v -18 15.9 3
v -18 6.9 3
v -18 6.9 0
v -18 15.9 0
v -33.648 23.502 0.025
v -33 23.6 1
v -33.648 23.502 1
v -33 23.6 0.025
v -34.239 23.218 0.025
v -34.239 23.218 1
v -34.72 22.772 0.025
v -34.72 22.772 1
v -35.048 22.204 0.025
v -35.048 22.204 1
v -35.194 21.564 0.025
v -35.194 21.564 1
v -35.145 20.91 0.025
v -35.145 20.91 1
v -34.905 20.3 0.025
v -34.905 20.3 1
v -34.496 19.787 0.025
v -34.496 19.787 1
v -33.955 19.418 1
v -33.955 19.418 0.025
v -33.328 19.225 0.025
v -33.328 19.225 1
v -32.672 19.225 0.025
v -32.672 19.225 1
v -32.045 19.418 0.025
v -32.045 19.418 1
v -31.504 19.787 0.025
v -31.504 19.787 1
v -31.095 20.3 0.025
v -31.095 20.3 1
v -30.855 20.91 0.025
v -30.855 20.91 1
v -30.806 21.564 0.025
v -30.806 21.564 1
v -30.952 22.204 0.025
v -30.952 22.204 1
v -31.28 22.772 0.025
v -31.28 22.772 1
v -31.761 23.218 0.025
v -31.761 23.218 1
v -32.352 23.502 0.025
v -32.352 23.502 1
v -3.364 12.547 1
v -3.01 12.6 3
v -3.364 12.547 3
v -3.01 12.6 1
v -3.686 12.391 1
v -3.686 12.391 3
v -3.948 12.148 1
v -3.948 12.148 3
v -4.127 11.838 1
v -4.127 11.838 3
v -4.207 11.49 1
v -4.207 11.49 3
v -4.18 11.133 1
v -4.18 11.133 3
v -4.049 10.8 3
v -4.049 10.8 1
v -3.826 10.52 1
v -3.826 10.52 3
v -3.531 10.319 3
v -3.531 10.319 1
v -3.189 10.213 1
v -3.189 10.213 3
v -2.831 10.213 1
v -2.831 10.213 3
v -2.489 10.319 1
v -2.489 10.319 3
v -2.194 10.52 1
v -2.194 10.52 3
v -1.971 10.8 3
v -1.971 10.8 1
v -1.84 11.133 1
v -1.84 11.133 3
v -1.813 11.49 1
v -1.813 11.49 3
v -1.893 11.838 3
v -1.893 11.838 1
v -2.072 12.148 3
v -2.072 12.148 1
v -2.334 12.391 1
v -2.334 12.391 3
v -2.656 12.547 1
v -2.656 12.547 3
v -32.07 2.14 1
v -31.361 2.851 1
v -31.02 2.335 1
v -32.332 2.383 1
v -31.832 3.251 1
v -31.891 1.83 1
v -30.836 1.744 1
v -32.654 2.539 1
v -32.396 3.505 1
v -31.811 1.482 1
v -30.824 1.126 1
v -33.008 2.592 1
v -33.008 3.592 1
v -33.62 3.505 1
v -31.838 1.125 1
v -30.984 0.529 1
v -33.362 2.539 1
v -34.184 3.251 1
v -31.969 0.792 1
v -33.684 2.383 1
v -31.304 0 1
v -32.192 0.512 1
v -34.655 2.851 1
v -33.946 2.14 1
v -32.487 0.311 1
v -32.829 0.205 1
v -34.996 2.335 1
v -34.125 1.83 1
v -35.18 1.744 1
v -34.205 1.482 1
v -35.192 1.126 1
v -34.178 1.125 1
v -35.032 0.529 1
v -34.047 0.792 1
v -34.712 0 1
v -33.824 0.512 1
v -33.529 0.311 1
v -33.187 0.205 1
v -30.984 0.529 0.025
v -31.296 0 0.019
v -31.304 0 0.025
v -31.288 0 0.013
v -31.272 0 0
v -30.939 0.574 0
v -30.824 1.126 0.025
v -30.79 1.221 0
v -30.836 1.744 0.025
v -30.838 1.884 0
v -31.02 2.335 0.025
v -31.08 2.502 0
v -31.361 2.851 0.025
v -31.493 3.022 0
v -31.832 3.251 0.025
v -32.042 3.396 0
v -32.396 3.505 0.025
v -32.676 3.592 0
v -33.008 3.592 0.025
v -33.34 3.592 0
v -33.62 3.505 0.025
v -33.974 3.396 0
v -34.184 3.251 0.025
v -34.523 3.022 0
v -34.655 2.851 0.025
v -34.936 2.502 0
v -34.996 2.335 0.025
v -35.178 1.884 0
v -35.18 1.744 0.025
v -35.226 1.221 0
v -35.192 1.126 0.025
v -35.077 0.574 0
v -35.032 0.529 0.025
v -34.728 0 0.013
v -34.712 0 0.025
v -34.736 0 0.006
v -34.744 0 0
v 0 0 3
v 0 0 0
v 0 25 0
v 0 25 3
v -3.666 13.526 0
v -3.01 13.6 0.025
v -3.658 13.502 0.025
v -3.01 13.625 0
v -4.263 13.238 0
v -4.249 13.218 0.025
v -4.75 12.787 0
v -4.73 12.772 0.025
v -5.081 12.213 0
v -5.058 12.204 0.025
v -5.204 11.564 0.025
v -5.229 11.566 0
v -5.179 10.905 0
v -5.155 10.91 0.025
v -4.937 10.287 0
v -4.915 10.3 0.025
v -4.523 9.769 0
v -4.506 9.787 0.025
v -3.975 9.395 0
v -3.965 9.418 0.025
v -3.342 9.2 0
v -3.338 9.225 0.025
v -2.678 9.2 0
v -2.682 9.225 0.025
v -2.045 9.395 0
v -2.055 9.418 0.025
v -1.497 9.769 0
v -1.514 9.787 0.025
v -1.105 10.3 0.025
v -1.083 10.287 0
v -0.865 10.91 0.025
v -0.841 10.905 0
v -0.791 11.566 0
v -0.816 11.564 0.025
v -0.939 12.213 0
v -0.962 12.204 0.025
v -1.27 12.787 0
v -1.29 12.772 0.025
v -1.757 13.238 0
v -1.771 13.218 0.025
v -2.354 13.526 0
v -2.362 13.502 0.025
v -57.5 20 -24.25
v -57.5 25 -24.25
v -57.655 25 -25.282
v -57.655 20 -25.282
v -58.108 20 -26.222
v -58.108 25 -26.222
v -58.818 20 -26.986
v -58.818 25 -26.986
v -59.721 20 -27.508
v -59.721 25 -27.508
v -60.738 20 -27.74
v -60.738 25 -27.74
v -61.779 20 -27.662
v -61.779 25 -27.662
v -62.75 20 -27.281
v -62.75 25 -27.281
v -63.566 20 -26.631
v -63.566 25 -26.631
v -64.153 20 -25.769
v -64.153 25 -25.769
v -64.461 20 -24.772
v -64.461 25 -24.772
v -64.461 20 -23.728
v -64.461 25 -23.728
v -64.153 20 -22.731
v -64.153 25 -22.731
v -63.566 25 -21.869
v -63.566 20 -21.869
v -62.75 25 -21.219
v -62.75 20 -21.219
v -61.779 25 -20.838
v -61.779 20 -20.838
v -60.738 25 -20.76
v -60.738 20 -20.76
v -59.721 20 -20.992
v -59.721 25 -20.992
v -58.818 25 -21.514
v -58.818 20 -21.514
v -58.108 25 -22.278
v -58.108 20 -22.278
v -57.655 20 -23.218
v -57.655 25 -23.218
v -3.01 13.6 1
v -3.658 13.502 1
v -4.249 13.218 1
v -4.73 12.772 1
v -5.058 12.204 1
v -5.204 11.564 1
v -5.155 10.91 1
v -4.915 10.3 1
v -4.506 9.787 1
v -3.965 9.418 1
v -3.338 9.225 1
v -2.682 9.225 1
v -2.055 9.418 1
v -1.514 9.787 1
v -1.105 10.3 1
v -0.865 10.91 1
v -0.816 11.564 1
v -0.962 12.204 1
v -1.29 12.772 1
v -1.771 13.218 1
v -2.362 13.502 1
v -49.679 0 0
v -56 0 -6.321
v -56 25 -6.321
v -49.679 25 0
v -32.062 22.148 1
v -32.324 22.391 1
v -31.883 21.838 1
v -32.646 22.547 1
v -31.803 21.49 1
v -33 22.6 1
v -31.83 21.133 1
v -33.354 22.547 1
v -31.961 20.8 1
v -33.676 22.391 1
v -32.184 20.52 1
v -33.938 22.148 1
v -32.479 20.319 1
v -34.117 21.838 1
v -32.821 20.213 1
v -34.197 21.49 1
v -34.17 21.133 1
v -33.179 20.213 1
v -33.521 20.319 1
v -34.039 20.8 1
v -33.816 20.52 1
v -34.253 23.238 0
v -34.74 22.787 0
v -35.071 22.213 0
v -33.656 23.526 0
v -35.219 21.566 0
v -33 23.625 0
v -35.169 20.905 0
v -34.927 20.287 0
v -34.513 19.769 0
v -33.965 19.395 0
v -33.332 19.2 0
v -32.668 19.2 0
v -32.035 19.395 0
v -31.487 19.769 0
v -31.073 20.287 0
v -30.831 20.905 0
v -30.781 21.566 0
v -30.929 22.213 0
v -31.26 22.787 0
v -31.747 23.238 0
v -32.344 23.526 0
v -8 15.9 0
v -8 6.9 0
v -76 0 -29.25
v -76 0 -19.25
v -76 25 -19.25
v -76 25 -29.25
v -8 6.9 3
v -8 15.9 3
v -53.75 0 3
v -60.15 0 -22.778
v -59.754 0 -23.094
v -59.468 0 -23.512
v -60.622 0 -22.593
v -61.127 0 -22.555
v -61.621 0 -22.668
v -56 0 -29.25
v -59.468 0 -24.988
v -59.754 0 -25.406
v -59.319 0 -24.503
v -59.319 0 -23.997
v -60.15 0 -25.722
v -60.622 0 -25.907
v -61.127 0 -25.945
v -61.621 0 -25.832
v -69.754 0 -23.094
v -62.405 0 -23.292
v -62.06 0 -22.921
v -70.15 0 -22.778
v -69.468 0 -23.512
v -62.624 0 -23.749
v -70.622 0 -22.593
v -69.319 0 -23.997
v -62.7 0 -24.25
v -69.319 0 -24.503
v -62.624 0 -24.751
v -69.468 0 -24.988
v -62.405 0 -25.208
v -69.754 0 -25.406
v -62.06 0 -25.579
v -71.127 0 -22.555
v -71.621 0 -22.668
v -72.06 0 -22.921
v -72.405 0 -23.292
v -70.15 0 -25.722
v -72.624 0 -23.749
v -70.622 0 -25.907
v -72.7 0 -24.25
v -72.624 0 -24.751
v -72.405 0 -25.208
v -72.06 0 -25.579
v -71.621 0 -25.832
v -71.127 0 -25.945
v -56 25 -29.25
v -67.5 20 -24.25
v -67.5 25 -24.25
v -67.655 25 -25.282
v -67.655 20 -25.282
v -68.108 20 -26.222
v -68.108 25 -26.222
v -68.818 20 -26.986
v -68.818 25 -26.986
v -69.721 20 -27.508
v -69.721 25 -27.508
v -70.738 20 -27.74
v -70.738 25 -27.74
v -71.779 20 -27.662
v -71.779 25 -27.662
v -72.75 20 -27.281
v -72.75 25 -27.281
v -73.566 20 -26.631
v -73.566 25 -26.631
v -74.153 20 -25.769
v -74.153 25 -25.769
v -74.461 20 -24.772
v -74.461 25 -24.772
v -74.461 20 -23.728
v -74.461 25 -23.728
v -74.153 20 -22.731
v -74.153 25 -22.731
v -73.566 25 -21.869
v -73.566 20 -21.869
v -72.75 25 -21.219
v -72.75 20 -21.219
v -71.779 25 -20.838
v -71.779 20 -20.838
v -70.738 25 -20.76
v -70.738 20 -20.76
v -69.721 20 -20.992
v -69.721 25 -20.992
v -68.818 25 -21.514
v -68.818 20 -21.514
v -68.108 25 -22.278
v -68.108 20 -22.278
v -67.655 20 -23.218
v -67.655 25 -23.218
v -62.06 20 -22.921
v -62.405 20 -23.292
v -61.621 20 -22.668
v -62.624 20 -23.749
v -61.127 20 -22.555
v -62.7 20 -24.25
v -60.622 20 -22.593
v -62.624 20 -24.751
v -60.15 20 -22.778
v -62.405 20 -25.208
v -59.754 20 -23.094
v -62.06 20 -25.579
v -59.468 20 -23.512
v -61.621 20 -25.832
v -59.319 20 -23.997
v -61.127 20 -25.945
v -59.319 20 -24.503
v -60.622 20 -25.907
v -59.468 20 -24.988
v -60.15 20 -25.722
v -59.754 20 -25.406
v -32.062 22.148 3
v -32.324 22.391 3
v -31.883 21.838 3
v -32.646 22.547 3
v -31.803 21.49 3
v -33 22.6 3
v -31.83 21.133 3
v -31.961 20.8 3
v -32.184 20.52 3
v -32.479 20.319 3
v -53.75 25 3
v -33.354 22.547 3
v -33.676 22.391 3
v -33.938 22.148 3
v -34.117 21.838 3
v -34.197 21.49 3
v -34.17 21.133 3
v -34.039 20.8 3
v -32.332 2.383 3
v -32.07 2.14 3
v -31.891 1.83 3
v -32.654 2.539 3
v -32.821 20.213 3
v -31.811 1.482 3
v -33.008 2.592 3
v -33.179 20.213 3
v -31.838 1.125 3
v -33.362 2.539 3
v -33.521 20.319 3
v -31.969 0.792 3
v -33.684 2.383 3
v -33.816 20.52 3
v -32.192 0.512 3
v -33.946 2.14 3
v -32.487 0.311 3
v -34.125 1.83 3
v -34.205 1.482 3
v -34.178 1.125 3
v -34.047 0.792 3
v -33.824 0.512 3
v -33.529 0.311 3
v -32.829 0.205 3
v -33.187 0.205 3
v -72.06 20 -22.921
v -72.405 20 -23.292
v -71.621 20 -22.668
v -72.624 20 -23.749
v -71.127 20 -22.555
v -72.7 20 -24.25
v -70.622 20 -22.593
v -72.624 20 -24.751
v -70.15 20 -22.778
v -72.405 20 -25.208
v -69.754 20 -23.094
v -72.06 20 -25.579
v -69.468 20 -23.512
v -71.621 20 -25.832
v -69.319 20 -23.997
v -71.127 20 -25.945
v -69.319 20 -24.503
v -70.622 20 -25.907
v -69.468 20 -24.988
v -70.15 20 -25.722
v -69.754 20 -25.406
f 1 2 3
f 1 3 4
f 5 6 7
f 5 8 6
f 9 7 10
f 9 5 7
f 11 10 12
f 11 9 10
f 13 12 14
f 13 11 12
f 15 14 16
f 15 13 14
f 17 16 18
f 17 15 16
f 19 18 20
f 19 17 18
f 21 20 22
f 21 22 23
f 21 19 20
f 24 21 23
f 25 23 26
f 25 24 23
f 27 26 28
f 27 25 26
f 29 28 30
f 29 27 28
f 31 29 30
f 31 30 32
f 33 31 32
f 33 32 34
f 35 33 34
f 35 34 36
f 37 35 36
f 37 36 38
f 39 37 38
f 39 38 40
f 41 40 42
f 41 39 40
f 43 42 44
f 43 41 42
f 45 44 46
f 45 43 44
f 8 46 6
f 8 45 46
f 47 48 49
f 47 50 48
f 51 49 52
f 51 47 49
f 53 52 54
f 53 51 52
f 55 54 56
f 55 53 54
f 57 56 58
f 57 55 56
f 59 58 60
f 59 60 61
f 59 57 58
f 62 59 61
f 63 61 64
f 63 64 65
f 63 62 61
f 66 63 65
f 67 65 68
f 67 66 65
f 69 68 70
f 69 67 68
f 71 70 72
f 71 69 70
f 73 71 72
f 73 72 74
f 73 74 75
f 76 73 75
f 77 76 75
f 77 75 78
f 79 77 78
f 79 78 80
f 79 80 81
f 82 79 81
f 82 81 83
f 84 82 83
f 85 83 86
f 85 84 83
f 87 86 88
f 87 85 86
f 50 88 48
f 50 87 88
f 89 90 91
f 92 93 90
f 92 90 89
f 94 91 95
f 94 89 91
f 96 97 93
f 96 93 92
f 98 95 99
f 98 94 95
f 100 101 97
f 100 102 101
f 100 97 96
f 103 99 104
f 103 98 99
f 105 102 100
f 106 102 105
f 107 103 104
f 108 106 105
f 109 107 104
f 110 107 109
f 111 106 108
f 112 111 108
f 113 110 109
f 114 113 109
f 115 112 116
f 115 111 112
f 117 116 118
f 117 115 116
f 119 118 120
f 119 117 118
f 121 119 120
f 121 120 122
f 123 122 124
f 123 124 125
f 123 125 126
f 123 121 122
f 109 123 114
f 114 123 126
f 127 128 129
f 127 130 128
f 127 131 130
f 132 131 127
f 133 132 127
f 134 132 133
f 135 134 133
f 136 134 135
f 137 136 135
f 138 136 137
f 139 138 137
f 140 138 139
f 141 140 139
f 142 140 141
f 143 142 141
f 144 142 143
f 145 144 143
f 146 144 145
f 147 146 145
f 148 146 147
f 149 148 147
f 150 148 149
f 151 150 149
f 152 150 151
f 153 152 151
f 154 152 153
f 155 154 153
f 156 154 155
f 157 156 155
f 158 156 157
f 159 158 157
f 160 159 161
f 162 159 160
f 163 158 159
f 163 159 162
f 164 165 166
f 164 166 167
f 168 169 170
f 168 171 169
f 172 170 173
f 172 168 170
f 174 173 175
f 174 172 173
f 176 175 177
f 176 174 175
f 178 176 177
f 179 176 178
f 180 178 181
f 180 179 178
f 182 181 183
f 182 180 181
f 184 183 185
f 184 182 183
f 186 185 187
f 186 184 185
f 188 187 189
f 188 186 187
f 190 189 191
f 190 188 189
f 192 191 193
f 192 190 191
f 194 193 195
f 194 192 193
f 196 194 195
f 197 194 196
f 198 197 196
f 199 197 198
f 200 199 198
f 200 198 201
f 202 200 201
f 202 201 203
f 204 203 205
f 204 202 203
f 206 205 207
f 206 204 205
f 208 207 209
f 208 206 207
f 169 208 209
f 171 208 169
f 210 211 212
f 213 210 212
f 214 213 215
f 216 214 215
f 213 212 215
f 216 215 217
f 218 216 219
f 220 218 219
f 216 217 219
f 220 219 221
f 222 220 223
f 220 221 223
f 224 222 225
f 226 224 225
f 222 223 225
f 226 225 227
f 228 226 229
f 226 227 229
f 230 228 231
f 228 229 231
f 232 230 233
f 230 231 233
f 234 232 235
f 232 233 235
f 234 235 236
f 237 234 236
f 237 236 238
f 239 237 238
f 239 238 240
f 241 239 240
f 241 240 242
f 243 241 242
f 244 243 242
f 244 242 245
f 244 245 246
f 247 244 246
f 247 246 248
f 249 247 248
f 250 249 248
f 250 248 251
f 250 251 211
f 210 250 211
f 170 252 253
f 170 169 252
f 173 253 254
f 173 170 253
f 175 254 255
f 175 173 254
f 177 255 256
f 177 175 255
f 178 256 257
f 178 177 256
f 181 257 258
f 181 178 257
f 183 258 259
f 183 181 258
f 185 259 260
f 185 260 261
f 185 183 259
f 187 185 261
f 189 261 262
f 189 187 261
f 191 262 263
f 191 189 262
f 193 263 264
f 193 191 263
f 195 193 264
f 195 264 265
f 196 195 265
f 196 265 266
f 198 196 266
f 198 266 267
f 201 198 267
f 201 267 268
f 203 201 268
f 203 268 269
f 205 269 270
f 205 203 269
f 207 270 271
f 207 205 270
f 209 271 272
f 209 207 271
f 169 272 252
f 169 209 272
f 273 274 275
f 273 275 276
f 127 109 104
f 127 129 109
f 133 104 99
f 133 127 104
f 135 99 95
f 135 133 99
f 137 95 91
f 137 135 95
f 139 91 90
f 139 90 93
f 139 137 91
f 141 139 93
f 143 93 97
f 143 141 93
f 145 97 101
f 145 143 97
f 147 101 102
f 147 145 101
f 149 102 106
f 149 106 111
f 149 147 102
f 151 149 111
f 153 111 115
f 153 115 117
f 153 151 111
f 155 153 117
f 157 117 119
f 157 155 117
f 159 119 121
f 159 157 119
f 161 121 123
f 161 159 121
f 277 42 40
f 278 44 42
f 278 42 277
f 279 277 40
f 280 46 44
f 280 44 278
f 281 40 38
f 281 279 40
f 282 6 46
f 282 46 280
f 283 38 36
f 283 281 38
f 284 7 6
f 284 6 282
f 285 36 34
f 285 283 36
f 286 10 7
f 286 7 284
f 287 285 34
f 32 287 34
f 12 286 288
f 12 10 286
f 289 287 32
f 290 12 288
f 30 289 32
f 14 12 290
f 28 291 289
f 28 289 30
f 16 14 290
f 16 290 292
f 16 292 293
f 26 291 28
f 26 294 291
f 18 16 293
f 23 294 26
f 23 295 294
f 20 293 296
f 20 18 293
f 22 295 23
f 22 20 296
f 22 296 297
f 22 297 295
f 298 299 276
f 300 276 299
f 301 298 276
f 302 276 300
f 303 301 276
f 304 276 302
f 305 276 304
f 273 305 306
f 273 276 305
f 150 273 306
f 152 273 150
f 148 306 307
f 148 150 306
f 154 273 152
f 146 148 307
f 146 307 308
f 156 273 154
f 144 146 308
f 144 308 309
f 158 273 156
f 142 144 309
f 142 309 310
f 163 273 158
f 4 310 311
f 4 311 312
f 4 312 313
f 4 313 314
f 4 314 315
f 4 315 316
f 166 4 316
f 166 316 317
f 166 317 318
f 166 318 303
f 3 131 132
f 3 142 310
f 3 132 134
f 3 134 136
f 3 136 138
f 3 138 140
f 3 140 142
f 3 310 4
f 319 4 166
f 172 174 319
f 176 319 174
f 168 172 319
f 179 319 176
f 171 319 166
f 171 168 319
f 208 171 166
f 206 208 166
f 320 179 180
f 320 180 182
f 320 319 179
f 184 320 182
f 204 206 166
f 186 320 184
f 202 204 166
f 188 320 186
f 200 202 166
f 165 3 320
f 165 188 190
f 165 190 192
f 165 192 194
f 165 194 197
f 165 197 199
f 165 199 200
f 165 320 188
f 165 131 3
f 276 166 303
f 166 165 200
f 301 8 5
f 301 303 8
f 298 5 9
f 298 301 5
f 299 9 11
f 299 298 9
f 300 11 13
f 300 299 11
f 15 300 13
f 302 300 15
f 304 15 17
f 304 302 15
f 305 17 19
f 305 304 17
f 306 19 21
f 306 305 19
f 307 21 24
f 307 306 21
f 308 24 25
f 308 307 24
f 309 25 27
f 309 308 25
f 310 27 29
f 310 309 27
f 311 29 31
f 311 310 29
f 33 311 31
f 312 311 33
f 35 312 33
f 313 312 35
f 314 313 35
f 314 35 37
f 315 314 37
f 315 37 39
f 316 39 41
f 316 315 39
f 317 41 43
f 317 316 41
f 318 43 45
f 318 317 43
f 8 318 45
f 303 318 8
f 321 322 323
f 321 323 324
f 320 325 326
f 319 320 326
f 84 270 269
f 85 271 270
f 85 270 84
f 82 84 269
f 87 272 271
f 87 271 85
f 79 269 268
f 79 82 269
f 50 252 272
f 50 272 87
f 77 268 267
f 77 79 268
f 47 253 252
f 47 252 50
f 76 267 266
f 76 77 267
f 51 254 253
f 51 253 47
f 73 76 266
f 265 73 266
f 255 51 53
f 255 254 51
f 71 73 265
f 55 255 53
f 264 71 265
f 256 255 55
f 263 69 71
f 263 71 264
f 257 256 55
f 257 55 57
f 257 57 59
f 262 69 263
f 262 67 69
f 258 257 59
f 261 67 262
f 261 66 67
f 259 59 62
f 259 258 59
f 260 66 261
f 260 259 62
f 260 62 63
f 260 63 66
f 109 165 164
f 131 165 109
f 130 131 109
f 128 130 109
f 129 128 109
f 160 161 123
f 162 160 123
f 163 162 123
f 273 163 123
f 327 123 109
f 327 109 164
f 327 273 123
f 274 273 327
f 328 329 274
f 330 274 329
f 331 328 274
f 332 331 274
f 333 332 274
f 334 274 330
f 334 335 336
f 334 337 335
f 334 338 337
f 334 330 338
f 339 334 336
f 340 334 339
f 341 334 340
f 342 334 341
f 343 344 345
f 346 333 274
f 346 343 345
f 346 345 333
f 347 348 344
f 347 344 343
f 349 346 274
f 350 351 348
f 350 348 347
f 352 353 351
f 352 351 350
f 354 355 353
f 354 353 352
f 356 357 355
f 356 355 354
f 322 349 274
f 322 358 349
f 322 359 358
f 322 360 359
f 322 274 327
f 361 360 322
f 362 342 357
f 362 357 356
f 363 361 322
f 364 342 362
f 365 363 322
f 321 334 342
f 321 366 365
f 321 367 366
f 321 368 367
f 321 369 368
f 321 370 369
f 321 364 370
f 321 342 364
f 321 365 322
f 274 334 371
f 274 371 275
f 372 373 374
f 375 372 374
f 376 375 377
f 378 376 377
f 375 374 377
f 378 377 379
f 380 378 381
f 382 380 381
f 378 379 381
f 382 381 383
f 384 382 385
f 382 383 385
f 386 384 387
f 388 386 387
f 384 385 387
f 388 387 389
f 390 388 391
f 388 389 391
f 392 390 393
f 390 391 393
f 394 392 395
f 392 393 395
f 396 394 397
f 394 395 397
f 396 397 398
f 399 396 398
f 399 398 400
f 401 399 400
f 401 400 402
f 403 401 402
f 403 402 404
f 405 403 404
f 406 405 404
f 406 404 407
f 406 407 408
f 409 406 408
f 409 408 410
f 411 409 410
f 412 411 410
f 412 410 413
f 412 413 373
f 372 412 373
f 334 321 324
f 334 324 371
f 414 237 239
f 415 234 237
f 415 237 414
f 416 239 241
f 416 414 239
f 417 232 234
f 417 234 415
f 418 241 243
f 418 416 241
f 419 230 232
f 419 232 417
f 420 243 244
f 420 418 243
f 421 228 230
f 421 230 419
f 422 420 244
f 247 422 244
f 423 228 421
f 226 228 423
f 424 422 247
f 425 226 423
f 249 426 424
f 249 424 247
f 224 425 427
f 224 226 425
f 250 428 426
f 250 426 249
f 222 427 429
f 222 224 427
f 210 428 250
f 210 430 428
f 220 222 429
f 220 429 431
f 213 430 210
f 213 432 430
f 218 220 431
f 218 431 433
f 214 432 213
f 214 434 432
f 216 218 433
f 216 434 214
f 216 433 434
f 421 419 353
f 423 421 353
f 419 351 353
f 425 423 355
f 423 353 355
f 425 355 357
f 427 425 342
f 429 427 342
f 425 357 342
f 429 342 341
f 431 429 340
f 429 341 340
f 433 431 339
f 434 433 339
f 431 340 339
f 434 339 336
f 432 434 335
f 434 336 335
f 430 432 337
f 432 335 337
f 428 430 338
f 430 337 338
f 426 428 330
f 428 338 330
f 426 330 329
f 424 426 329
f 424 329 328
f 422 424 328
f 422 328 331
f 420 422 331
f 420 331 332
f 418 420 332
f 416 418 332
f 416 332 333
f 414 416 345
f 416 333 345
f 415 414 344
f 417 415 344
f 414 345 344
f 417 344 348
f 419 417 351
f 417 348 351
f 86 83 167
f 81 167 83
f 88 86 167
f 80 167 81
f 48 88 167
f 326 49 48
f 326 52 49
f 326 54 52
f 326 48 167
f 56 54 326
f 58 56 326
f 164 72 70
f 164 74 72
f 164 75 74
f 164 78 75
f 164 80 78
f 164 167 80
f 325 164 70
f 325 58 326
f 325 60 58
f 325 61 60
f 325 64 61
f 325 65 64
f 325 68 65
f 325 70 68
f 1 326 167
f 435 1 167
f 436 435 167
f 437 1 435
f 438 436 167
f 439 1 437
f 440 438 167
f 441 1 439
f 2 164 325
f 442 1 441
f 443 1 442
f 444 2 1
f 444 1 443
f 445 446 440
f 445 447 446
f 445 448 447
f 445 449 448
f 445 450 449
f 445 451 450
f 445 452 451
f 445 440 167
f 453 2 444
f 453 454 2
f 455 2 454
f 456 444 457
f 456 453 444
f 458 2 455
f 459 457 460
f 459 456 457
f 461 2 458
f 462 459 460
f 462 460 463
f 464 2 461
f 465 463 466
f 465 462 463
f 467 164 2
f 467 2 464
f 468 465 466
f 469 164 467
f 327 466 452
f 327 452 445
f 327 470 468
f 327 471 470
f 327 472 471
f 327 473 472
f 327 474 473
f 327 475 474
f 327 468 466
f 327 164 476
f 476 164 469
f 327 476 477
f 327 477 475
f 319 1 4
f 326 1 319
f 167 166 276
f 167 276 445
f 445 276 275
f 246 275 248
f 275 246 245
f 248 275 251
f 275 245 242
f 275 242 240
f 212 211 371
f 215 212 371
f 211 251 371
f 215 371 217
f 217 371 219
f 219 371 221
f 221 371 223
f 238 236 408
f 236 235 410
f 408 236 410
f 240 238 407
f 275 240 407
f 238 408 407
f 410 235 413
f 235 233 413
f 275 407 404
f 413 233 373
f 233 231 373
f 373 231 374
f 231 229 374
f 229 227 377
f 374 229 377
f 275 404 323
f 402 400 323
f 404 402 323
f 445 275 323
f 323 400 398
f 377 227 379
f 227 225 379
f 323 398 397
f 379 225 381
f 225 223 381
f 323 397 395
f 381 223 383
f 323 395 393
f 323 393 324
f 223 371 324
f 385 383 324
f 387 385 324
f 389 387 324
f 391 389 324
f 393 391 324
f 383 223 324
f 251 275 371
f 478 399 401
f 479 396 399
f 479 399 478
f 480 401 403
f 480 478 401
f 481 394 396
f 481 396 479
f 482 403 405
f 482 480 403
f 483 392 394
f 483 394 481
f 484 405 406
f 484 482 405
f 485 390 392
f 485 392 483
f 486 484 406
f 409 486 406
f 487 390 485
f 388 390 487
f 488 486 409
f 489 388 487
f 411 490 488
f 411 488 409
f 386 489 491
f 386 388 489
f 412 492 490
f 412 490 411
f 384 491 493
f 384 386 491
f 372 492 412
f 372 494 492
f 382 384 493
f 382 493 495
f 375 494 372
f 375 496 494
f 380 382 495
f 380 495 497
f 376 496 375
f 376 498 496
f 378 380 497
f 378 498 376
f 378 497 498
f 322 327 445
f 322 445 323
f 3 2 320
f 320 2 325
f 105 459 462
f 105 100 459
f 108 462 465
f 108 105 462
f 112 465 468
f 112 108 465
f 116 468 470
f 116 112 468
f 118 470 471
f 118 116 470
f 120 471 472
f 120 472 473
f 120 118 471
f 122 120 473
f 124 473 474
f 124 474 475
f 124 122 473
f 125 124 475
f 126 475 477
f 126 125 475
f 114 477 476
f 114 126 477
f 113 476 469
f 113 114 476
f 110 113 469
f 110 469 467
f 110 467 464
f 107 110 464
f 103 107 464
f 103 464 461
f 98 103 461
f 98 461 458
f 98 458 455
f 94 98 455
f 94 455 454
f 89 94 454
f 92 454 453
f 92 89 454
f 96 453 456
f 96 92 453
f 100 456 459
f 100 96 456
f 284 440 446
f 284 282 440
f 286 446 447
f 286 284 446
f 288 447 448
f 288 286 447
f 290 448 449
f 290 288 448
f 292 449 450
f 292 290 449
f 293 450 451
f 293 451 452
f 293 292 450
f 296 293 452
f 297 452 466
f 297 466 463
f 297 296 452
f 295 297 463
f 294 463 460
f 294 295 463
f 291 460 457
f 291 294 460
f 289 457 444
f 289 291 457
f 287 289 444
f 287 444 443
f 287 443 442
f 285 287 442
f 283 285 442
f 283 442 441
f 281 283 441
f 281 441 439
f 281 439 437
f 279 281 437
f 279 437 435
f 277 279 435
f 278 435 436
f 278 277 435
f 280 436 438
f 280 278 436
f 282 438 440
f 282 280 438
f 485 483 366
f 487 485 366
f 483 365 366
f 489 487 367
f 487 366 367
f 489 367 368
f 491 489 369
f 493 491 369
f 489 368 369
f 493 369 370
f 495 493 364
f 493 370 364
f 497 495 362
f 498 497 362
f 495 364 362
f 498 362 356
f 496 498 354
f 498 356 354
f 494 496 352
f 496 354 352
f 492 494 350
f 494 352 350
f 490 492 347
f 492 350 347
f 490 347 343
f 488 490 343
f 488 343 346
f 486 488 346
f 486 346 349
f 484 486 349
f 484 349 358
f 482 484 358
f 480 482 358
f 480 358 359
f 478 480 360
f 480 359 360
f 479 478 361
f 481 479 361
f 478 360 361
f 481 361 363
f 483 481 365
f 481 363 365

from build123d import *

# Parameters (mm, degrees)
BOSS_EXTRUDE1_DEPTH                          = 25
SKETCH2_W                                    = 10
SKETCH2_H                                    = 9
CUT_EXTRUDE1_DEPTH                           = 87.261593424
CBORE_FOR_M3_PAN_HEAD_SCREW1_D               = 3.4
CBORE_FOR_M3_PAN_HEAD_SCREW1_CBORE_D         = 7
CBORE_FOR_M3_PAN_HEAD_SCREW1_CBORE_DEPTH     = 5
CBORE_FOR_M2_HEX_SOCKET_HEAD_CAP_SCR_2_COUNT = 2
CBORE_FOR_M2_HEX_SOCKET_HEAD_CAP_SCR_2_PITCH = 20.008001599
CBORE_FOR_M2_HEX_SOCKET_HEAD_CAP_SCR_3_COUNT = 2
CBORE_FOR_M2_HEX_SOCKET_HEAD_CAP_SCR_3_PITCH = 31.613289927


with BuildPart() as part:
    # Sketch1 → Boss-Extrude1 (new body)
    with BuildSketch(Plane(origin=(0, 0, 0), x_dir=(1, 0, 0), z_dir=(0, 1, 0))):
        Polygon((0, 0), (0, -3), (-53.75, -3), (-76, 19.25), (-76, 29.25), (-56, 29.25), (-56, 6.321067812), (-49.678932188, 0), align=None)
    extrude(amount=BOSS_EXTRUDE1_DEPTH)

    # Sketch2 → Cut-Extrude1 (cut, through all)
    with BuildSketch(Plane.XY.offset(3)):
        with Locations((-13, 11.4)):
            Rectangle(SKETCH2_W, SKETCH2_H)
    extrude(amount=-CUT_EXTRUDE1_DEPTH, mode=Mode.SUBTRACT)

    # CBORE for M3 Pan Head Screw1 (through all)
    with Locations(Plane(origin=(0, 25, 0), x_dir=(1, 0, 0), z_dir=(0, 1, 0))):
        with Locations((-71, 24.25), (-61, 24.25)):
            CounterBoreHole(CBORE_FOR_M3_PAN_HEAD_SCREW1_D / 2, CBORE_FOR_M3_PAN_HEAD_SCREW1_CBORE_D / 2, CBORE_FOR_M3_PAN_HEAD_SCREW1_CBORE_DEPTH)

    # Sketch6 → CBORE for M2 Hex Socket Head Cap Screw1 (revolve, cut)
    with BuildSketch(Plane(origin=(-33, 21.4, 0), x_dir=(0, 1, 0), z_dir=(1, 0, 0))):
        Polygon((0, 0), (0, 3), (1.2, 3), (1.2, 1), (2.2, 1), (2.2, 0.025), (2.225, 0), align=None)
    cbore_for_m2_hex_socket_head_cap_screw1 = revolve(axis=Axis((-33, 21.4, -6.35), (0, 0, 1)), mode=Mode.SUBTRACT)

    # CBORE for M2 Hex Socket Head Cap Scr 2: CBORE for M2 Hex Socket Head Cap Screw1 ×2
    with Locations(*[Vector(-0.0003998400320129169, -0.9999999200639712, 0) * (i * CBORE_FOR_M2_HEX_SOCKET_HEAD_CAP_SCR_2_PITCH) for i in range(1, CBORE_FOR_M2_HEX_SOCKET_HEAD_CAP_SCR_2_COUNT)]):
        add(cbore_for_m2_hex_socket_head_cap_screw1, mode=Mode.SUBTRACT)

    # CBORE for M2 Hex Socket Head Cap Scr 3: CBORE for M2 Hex Socket Head Cap Screw1 ×2
    with Locations(*[Vector(0.9486516610381267, -0.31632266123312, 0) * (i * CBORE_FOR_M2_HEX_SOCKET_HEAD_CAP_SCR_3_PITCH) for i in range(1, CBORE_FOR_M2_HEX_SOCKET_HEAD_CAP_SCR_3_COUNT)]):
        add(cbore_for_m2_hex_socket_head_cap_screw1, mode=Mode.SUBTRACT)


solid = part.part
